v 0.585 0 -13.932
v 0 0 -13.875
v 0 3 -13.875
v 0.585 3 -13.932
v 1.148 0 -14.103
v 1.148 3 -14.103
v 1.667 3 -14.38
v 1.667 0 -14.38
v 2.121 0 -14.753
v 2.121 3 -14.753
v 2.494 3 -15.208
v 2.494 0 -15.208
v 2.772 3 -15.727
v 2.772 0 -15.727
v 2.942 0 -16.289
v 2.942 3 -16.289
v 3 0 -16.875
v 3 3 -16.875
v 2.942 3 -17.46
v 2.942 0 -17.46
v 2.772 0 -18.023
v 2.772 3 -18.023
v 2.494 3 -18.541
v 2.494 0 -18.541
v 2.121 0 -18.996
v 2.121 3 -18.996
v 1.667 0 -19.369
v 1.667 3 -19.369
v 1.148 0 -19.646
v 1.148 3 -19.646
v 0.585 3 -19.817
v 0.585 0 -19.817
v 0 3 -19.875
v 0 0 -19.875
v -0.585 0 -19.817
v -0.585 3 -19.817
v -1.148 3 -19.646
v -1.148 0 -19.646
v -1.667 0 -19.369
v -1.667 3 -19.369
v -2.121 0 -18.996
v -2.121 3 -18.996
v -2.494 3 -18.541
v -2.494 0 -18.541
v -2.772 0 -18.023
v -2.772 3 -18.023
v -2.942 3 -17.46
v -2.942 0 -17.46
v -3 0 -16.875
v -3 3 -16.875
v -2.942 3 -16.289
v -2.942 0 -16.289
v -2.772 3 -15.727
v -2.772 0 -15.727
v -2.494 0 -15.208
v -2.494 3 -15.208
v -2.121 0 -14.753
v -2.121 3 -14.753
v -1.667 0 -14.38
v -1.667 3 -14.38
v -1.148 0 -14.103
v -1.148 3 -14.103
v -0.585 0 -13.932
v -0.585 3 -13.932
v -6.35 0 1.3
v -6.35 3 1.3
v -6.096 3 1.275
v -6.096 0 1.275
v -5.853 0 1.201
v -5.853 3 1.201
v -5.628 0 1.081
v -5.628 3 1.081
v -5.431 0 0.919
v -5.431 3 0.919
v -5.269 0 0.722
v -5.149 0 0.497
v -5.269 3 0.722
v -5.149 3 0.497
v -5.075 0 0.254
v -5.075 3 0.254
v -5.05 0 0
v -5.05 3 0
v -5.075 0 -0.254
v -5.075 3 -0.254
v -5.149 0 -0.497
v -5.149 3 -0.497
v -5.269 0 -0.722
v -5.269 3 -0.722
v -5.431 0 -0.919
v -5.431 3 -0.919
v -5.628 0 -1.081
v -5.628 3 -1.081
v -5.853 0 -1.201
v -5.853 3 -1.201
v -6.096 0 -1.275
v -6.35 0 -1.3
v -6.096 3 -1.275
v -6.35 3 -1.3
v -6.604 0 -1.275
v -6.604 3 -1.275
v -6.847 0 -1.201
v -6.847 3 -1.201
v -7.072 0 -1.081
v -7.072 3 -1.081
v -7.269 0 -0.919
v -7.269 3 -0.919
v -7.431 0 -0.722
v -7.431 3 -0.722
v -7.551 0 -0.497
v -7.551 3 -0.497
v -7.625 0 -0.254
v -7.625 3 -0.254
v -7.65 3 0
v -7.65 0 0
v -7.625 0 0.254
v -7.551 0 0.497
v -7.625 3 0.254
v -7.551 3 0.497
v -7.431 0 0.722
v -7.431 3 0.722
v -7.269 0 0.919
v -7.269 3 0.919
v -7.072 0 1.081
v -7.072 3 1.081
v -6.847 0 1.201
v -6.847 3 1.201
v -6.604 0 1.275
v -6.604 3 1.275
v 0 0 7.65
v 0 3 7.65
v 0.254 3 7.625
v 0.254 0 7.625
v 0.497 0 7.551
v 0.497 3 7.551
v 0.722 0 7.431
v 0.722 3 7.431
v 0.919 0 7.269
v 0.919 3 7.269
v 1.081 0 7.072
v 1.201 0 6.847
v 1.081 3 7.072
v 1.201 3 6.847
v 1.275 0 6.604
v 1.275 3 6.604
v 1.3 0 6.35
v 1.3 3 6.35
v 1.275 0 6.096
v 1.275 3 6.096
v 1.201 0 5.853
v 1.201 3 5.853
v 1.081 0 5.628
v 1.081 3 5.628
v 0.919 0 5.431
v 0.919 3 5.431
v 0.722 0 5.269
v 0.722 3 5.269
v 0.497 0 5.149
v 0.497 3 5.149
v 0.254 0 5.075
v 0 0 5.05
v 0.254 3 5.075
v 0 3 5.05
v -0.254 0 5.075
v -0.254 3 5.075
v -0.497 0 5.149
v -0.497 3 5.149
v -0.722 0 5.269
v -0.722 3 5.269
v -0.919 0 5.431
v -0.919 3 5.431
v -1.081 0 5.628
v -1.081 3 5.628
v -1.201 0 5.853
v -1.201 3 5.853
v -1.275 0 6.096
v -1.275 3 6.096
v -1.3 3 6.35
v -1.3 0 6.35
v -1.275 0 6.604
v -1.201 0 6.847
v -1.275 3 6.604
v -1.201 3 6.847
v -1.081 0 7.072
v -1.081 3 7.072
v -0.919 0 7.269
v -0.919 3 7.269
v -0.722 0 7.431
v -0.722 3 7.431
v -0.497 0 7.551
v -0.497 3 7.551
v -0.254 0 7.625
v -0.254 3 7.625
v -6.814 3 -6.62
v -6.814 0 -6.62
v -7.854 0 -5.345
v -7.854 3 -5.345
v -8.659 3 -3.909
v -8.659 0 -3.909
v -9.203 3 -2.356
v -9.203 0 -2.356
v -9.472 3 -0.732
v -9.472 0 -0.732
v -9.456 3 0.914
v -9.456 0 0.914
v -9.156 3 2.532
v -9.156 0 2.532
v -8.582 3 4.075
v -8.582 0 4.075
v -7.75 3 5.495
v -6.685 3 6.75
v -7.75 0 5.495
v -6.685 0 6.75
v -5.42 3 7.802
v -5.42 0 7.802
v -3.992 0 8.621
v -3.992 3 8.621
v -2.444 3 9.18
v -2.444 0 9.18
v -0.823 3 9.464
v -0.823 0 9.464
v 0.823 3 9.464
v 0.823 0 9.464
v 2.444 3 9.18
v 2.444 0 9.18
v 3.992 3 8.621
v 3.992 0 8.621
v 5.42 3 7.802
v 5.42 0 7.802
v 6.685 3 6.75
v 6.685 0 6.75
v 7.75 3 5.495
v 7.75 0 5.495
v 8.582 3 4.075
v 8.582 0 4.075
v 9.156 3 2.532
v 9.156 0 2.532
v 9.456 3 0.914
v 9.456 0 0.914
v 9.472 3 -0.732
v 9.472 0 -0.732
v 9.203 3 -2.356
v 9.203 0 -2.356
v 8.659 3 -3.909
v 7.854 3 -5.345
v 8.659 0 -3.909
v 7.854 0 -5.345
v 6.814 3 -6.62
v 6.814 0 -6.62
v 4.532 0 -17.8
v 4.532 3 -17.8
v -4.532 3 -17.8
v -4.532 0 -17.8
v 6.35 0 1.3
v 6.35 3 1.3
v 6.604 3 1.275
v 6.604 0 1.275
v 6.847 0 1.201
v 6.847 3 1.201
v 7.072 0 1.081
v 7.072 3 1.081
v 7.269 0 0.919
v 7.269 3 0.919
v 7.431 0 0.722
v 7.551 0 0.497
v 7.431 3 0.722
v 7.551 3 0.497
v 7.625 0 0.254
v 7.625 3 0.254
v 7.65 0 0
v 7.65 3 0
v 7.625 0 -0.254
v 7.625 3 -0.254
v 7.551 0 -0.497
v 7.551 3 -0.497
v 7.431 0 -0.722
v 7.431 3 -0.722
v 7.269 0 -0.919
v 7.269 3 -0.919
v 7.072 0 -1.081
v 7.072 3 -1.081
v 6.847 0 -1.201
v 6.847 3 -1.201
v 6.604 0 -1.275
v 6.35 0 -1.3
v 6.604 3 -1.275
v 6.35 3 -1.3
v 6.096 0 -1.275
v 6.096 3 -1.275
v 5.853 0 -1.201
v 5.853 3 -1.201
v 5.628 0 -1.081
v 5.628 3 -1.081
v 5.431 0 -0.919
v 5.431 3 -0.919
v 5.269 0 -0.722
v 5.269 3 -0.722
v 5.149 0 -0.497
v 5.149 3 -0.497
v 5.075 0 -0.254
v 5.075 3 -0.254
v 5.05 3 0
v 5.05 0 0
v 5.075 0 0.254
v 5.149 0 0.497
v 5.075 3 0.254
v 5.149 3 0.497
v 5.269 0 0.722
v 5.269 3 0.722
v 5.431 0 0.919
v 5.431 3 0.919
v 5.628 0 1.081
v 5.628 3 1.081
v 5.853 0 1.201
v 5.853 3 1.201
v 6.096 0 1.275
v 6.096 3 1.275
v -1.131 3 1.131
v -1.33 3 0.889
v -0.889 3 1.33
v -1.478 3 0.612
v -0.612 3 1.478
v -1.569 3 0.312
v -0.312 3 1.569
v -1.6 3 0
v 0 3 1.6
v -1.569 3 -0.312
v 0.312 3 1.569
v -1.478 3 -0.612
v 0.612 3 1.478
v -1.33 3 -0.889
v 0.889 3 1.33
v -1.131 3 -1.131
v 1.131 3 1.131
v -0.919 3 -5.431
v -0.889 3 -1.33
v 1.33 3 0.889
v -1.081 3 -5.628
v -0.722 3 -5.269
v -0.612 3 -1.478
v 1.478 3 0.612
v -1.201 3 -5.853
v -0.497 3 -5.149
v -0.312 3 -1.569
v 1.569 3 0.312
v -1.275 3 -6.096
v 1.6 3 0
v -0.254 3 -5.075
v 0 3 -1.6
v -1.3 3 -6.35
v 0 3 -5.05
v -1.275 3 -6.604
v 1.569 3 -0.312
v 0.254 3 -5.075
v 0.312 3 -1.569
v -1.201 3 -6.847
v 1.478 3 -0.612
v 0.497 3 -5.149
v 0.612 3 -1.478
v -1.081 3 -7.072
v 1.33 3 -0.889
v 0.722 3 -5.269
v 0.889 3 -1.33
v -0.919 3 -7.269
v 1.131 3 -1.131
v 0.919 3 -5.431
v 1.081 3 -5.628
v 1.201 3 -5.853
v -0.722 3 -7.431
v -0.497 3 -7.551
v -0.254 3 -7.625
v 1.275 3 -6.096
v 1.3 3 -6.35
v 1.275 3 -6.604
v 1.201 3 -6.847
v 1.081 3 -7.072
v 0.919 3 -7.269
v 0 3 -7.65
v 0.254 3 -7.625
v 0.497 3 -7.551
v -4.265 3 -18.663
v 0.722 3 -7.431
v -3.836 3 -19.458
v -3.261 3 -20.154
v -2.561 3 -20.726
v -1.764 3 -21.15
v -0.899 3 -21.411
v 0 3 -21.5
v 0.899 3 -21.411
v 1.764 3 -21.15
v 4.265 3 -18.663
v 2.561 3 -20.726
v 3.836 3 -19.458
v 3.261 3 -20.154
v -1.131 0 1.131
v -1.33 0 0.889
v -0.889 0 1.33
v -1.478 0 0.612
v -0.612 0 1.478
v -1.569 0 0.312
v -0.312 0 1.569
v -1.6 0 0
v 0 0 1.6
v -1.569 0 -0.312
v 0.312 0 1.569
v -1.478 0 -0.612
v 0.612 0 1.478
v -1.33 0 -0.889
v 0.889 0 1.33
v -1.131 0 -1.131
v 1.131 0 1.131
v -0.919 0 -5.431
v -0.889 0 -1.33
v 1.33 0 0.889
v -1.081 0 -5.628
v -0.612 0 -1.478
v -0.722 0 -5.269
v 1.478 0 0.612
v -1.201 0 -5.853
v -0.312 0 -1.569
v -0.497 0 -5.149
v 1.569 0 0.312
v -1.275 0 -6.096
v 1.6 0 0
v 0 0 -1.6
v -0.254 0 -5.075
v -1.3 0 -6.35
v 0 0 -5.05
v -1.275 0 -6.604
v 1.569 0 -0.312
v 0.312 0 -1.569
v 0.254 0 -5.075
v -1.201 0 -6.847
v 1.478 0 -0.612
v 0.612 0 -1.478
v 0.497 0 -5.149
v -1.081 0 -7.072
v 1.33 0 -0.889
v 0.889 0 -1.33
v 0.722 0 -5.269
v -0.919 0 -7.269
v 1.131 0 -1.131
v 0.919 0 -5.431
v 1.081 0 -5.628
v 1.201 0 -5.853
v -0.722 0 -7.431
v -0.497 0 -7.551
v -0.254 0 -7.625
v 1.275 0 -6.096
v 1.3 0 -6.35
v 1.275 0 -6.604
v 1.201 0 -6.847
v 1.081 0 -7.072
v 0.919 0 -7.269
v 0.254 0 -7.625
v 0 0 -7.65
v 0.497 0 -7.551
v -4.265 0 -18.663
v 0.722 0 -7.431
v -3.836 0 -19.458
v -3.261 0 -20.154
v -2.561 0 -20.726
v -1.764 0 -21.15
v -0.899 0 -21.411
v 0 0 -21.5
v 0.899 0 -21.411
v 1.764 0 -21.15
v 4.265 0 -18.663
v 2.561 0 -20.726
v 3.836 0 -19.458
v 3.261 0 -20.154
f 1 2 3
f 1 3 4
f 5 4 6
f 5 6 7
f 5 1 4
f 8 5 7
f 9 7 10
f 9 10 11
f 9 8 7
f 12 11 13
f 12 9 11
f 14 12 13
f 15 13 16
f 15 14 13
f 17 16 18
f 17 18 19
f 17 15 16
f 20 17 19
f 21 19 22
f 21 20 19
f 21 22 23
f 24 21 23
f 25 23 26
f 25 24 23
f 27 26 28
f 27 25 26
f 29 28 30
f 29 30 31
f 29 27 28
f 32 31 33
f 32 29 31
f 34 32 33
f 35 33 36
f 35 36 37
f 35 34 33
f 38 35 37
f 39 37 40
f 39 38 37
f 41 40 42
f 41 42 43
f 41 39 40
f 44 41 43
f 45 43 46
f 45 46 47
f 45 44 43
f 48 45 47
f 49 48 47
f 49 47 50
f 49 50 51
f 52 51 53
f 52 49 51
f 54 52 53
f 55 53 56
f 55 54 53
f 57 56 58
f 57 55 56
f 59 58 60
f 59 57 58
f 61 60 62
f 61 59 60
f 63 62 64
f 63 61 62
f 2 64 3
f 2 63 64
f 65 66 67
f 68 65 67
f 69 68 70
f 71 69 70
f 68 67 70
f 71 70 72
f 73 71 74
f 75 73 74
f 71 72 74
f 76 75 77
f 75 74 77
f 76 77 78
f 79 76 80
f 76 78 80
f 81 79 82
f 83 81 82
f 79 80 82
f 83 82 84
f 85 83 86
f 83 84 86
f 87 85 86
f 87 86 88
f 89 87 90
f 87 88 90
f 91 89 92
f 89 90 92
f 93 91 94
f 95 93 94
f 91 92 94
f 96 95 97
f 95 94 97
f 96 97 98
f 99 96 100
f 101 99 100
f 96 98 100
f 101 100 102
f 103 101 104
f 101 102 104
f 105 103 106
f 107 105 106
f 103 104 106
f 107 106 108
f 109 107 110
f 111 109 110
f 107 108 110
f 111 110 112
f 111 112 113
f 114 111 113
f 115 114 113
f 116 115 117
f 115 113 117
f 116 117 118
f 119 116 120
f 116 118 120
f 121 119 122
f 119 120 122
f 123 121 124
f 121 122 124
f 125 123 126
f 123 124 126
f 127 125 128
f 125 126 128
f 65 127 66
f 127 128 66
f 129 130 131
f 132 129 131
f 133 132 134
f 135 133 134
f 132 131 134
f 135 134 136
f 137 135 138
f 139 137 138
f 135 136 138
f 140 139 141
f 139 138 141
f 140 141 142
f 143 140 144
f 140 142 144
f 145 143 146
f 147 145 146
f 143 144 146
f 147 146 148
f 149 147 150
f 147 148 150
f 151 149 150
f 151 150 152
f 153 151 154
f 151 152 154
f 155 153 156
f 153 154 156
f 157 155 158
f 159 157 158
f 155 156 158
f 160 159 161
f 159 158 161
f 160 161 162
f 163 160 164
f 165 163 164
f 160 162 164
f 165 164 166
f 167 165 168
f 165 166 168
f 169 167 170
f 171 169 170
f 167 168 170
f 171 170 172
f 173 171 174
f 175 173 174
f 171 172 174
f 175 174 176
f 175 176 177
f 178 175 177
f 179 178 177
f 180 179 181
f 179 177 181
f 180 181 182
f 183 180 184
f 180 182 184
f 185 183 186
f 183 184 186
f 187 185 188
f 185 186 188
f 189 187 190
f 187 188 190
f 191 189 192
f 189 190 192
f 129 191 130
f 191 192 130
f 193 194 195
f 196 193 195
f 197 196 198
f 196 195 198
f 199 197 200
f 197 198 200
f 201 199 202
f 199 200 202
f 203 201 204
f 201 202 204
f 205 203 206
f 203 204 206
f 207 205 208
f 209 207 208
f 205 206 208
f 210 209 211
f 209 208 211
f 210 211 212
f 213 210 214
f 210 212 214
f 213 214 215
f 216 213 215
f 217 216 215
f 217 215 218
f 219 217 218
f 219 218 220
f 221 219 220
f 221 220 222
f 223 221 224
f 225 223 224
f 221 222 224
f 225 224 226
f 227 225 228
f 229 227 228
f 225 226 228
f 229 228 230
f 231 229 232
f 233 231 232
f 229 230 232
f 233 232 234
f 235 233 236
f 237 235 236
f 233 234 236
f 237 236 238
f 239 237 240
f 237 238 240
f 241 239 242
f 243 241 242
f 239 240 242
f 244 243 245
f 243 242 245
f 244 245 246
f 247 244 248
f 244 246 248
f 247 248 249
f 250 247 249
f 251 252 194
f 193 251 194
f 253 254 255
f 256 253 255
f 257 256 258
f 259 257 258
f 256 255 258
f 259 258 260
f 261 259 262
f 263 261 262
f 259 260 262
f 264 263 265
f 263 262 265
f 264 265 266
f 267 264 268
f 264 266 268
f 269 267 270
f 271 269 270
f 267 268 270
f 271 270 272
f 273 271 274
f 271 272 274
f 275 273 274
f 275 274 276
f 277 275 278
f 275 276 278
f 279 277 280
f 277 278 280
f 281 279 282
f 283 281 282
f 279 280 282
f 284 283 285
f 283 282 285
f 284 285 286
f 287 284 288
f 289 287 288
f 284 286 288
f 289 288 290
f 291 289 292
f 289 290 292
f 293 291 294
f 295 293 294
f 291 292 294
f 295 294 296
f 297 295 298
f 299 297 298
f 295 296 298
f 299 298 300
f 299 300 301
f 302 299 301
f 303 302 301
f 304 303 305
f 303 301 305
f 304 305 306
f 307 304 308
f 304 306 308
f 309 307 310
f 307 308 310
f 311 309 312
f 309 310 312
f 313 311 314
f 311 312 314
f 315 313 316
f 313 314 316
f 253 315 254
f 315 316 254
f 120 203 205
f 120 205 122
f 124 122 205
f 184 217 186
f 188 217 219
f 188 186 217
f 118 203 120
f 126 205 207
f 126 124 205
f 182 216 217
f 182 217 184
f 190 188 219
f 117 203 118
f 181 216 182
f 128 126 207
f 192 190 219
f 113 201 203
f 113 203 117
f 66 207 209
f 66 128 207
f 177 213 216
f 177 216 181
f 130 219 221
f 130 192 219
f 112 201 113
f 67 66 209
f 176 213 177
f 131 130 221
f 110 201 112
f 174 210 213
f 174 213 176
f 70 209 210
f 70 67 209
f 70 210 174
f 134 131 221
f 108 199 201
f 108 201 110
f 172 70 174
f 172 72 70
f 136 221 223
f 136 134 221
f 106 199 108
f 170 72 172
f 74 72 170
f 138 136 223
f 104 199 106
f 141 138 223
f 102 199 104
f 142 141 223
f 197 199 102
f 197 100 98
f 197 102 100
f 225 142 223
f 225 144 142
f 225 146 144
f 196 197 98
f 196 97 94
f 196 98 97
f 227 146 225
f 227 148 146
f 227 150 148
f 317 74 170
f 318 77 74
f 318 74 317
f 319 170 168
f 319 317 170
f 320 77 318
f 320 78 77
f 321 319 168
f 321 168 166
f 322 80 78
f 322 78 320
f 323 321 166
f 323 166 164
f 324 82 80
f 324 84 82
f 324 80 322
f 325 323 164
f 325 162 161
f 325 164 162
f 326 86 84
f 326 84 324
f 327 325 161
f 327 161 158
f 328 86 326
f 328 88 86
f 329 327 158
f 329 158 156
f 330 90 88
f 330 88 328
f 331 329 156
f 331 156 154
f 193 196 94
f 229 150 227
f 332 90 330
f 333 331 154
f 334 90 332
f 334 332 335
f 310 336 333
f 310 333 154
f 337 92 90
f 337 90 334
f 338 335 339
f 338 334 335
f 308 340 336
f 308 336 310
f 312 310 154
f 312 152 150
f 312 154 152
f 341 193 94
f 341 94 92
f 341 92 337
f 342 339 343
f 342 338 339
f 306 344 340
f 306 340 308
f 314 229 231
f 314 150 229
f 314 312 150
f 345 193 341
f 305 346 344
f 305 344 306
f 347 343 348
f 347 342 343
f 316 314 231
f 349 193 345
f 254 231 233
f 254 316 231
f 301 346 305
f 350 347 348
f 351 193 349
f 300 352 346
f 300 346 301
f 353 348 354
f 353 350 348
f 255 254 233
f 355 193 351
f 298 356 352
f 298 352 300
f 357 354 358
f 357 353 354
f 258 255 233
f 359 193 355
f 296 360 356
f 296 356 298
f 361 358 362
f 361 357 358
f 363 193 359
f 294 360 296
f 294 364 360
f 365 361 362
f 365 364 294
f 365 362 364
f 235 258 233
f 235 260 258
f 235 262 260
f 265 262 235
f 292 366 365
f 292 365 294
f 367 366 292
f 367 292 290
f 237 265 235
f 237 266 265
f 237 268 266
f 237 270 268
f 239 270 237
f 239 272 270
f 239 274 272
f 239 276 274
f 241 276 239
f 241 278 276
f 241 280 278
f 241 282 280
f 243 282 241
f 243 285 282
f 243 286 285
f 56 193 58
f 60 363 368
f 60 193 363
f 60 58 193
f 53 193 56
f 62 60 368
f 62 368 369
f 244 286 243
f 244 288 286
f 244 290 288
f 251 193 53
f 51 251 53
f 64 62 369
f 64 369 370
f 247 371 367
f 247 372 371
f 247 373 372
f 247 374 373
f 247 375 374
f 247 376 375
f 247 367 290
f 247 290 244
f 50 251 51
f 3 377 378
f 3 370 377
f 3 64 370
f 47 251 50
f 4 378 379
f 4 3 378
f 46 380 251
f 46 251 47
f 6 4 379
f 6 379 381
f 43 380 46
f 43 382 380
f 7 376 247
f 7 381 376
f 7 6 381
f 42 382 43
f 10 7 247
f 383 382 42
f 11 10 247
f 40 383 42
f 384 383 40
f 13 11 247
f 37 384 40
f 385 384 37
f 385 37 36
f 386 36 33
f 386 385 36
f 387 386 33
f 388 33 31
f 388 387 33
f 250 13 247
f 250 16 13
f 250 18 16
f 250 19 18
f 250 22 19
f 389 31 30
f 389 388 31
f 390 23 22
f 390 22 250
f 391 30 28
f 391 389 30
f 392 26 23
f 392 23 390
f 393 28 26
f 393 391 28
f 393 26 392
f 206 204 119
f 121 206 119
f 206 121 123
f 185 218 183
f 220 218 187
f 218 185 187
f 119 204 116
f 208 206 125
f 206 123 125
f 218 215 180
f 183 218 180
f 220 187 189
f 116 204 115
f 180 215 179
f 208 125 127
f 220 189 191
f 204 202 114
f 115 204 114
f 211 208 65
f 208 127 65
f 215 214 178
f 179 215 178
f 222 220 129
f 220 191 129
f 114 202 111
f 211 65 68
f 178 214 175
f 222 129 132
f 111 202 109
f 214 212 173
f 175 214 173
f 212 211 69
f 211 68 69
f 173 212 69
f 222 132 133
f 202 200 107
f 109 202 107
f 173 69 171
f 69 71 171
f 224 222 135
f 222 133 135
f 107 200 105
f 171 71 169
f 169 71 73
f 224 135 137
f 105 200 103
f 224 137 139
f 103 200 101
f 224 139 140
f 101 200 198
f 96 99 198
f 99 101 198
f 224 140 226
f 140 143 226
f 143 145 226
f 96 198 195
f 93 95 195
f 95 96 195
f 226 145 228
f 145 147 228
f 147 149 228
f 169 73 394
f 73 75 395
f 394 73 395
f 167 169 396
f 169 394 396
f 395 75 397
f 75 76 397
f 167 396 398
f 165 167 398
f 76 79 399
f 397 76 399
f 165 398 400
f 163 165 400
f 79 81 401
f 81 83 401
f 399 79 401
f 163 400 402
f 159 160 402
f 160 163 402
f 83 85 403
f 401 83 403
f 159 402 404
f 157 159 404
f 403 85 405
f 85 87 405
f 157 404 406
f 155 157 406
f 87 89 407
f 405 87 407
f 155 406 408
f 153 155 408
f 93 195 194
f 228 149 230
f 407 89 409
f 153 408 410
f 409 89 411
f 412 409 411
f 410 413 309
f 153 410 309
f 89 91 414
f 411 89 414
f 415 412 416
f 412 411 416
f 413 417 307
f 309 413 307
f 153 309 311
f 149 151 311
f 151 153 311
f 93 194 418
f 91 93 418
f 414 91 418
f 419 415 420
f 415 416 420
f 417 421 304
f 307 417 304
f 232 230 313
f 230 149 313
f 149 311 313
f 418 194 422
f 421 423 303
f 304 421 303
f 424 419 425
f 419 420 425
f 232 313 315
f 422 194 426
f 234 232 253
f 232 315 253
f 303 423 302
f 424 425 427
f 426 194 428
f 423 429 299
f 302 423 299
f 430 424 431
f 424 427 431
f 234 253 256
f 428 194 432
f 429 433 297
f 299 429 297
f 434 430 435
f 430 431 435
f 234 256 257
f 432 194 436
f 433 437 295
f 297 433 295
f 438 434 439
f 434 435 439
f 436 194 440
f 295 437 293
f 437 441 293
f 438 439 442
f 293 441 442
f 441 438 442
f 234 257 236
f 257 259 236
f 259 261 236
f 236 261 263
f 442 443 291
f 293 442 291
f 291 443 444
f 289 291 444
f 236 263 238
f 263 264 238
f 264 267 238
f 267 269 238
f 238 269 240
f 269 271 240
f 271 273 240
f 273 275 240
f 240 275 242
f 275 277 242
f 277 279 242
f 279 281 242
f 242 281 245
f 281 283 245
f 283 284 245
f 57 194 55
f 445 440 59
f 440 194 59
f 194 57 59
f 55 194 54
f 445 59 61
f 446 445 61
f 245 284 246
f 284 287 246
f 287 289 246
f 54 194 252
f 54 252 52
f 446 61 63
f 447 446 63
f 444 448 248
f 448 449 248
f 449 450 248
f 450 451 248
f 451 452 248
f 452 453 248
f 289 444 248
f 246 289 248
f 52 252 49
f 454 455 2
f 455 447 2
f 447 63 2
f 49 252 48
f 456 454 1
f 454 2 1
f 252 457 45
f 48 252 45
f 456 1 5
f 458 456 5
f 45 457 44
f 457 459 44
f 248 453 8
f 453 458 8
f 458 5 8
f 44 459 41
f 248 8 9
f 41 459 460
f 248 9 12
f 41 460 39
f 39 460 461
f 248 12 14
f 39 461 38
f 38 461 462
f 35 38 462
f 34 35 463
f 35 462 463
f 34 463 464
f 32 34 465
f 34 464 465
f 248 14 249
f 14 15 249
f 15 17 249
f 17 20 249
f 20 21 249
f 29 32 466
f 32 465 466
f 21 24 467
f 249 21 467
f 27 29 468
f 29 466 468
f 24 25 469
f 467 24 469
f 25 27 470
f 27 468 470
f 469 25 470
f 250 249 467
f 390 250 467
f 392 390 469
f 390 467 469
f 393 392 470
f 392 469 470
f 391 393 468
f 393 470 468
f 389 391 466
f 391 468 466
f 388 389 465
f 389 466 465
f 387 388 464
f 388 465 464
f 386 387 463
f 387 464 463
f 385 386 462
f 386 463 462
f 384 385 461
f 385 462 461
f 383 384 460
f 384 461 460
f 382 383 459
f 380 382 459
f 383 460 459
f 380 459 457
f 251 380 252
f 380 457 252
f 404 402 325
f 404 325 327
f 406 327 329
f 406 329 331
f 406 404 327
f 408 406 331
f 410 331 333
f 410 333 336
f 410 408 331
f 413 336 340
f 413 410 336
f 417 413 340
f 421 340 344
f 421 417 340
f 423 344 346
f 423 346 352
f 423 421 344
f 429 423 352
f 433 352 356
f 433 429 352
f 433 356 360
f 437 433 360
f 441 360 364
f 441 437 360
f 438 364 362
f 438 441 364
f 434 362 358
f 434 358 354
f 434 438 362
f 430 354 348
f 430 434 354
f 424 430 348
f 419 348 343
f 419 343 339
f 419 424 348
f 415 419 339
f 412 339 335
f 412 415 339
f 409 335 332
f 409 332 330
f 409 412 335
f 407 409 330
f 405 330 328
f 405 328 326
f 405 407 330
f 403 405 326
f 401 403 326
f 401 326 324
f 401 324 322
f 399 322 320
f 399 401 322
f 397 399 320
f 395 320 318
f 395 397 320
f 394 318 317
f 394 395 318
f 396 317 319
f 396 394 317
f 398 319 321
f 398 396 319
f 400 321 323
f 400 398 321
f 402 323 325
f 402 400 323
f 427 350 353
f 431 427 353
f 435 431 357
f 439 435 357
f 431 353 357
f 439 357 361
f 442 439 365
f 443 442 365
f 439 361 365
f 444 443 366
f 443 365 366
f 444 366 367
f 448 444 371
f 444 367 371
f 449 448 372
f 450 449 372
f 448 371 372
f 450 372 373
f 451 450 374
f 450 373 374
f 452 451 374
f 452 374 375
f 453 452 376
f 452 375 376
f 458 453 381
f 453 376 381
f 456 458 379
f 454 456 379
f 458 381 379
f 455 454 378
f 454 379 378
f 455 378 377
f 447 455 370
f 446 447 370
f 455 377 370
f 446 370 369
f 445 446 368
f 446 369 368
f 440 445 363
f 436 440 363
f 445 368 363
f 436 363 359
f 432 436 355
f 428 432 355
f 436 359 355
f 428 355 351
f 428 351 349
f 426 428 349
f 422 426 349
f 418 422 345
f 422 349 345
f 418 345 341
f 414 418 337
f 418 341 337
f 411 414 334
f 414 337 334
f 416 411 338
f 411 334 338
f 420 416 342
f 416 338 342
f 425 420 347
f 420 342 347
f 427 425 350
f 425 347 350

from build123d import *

# Parameters (mm, degrees)
SKETCH1_R           = 3
SKETCH1_R_2         = 1.6
BOSS_EXTRUDE1_DEPTH = 3
SKETCH2_R           = 1.3
CUT_EXTRUDE1_DEPTH  = 3
BOSS_EXTRUDE2_START = -3
BOSS_EXTRUDE2_DEPTH = 3


with BuildPart() as part:
    # Sketch1 → Boss-Extrude1 (new body)
    with BuildSketch(Plane(origin=(0, 0, 0), x_dir=(1, 0, 0), z_dir=(0, 1, 0))):
        with BuildLine():
            Line((-4.531642246, 17.7995776), (-7.838367177, 1.6))
            ThreePointArc((-7.838367177, 1.6), (0, -8), (7.838367177, 1.6))
            Line((7.838367177, 1.6), (4.531642246, 17.7995776))
            ThreePointArc((4.531642246, 17.7995776), (0, 21.499648), (-4.531642246, 17.7995776))
        make_face()
        with Locations(Location((0, 16.87456, 0), (0, 0, 270))):
            Circle(SKETCH1_R, mode=Mode.SUBTRACT)
        with Locations(Location((0, 0, 0), (0, 0, 270))):
            Circle(SKETCH1_R_2, mode=Mode.SUBTRACT)
    extrude(amount=BOSS_EXTRUDE1_DEPTH)

    # Sketch2 → Cut-Extrude1 (cut)
    with BuildSketch(Plane(origin=(0, 3, 0), x_dir=(1, 0, 0), z_dir=(0, 1, 0))):
        with Locations(Location((0, 6.35, 0), (0, 0, 270))):
            Circle(SKETCH2_R)
        with Locations(Location((6.35, 0, 0), (0, 0, 270))):
            Circle(SKETCH2_R)
        with Locations(Location((0, -6.35, 0), (0, 0, 270))):
            Circle(SKETCH2_R)
        with Locations(Location((-6.35, 0, 0), (0, 0, 270))):
            Circle(SKETCH2_R)
    extrude(amount=-CUT_EXTRUDE1_DEPTH, mode=Mode.SUBTRACT)

    # Sketch3 → Boss-Extrude2 (add)
    with BuildSketch(Plane(origin=(0, 3, 0), x_dir=(1, 0, 0), z_dir=(0, 1, 0)).offset(BOSS_EXTRUDE2_START)):
        with BuildLine():
            Line((-7.838367177, 1.6), (-6.8136721, 6.619960159))
            ThreePointArc((-6.8136721, 6.619960159), (0, -9.5), (6.8136721, 6.619960159))
            Line((6.8136721, 6.619960159), (7.838367177, 1.6))
            ThreePointArc((7.838367177, 1.6), (0, -8), (-7.838367177, 1.6))
        make_face()
    extrude(amount=BOSS_EXTRUDE2_DEPTH)


solid = part.part
